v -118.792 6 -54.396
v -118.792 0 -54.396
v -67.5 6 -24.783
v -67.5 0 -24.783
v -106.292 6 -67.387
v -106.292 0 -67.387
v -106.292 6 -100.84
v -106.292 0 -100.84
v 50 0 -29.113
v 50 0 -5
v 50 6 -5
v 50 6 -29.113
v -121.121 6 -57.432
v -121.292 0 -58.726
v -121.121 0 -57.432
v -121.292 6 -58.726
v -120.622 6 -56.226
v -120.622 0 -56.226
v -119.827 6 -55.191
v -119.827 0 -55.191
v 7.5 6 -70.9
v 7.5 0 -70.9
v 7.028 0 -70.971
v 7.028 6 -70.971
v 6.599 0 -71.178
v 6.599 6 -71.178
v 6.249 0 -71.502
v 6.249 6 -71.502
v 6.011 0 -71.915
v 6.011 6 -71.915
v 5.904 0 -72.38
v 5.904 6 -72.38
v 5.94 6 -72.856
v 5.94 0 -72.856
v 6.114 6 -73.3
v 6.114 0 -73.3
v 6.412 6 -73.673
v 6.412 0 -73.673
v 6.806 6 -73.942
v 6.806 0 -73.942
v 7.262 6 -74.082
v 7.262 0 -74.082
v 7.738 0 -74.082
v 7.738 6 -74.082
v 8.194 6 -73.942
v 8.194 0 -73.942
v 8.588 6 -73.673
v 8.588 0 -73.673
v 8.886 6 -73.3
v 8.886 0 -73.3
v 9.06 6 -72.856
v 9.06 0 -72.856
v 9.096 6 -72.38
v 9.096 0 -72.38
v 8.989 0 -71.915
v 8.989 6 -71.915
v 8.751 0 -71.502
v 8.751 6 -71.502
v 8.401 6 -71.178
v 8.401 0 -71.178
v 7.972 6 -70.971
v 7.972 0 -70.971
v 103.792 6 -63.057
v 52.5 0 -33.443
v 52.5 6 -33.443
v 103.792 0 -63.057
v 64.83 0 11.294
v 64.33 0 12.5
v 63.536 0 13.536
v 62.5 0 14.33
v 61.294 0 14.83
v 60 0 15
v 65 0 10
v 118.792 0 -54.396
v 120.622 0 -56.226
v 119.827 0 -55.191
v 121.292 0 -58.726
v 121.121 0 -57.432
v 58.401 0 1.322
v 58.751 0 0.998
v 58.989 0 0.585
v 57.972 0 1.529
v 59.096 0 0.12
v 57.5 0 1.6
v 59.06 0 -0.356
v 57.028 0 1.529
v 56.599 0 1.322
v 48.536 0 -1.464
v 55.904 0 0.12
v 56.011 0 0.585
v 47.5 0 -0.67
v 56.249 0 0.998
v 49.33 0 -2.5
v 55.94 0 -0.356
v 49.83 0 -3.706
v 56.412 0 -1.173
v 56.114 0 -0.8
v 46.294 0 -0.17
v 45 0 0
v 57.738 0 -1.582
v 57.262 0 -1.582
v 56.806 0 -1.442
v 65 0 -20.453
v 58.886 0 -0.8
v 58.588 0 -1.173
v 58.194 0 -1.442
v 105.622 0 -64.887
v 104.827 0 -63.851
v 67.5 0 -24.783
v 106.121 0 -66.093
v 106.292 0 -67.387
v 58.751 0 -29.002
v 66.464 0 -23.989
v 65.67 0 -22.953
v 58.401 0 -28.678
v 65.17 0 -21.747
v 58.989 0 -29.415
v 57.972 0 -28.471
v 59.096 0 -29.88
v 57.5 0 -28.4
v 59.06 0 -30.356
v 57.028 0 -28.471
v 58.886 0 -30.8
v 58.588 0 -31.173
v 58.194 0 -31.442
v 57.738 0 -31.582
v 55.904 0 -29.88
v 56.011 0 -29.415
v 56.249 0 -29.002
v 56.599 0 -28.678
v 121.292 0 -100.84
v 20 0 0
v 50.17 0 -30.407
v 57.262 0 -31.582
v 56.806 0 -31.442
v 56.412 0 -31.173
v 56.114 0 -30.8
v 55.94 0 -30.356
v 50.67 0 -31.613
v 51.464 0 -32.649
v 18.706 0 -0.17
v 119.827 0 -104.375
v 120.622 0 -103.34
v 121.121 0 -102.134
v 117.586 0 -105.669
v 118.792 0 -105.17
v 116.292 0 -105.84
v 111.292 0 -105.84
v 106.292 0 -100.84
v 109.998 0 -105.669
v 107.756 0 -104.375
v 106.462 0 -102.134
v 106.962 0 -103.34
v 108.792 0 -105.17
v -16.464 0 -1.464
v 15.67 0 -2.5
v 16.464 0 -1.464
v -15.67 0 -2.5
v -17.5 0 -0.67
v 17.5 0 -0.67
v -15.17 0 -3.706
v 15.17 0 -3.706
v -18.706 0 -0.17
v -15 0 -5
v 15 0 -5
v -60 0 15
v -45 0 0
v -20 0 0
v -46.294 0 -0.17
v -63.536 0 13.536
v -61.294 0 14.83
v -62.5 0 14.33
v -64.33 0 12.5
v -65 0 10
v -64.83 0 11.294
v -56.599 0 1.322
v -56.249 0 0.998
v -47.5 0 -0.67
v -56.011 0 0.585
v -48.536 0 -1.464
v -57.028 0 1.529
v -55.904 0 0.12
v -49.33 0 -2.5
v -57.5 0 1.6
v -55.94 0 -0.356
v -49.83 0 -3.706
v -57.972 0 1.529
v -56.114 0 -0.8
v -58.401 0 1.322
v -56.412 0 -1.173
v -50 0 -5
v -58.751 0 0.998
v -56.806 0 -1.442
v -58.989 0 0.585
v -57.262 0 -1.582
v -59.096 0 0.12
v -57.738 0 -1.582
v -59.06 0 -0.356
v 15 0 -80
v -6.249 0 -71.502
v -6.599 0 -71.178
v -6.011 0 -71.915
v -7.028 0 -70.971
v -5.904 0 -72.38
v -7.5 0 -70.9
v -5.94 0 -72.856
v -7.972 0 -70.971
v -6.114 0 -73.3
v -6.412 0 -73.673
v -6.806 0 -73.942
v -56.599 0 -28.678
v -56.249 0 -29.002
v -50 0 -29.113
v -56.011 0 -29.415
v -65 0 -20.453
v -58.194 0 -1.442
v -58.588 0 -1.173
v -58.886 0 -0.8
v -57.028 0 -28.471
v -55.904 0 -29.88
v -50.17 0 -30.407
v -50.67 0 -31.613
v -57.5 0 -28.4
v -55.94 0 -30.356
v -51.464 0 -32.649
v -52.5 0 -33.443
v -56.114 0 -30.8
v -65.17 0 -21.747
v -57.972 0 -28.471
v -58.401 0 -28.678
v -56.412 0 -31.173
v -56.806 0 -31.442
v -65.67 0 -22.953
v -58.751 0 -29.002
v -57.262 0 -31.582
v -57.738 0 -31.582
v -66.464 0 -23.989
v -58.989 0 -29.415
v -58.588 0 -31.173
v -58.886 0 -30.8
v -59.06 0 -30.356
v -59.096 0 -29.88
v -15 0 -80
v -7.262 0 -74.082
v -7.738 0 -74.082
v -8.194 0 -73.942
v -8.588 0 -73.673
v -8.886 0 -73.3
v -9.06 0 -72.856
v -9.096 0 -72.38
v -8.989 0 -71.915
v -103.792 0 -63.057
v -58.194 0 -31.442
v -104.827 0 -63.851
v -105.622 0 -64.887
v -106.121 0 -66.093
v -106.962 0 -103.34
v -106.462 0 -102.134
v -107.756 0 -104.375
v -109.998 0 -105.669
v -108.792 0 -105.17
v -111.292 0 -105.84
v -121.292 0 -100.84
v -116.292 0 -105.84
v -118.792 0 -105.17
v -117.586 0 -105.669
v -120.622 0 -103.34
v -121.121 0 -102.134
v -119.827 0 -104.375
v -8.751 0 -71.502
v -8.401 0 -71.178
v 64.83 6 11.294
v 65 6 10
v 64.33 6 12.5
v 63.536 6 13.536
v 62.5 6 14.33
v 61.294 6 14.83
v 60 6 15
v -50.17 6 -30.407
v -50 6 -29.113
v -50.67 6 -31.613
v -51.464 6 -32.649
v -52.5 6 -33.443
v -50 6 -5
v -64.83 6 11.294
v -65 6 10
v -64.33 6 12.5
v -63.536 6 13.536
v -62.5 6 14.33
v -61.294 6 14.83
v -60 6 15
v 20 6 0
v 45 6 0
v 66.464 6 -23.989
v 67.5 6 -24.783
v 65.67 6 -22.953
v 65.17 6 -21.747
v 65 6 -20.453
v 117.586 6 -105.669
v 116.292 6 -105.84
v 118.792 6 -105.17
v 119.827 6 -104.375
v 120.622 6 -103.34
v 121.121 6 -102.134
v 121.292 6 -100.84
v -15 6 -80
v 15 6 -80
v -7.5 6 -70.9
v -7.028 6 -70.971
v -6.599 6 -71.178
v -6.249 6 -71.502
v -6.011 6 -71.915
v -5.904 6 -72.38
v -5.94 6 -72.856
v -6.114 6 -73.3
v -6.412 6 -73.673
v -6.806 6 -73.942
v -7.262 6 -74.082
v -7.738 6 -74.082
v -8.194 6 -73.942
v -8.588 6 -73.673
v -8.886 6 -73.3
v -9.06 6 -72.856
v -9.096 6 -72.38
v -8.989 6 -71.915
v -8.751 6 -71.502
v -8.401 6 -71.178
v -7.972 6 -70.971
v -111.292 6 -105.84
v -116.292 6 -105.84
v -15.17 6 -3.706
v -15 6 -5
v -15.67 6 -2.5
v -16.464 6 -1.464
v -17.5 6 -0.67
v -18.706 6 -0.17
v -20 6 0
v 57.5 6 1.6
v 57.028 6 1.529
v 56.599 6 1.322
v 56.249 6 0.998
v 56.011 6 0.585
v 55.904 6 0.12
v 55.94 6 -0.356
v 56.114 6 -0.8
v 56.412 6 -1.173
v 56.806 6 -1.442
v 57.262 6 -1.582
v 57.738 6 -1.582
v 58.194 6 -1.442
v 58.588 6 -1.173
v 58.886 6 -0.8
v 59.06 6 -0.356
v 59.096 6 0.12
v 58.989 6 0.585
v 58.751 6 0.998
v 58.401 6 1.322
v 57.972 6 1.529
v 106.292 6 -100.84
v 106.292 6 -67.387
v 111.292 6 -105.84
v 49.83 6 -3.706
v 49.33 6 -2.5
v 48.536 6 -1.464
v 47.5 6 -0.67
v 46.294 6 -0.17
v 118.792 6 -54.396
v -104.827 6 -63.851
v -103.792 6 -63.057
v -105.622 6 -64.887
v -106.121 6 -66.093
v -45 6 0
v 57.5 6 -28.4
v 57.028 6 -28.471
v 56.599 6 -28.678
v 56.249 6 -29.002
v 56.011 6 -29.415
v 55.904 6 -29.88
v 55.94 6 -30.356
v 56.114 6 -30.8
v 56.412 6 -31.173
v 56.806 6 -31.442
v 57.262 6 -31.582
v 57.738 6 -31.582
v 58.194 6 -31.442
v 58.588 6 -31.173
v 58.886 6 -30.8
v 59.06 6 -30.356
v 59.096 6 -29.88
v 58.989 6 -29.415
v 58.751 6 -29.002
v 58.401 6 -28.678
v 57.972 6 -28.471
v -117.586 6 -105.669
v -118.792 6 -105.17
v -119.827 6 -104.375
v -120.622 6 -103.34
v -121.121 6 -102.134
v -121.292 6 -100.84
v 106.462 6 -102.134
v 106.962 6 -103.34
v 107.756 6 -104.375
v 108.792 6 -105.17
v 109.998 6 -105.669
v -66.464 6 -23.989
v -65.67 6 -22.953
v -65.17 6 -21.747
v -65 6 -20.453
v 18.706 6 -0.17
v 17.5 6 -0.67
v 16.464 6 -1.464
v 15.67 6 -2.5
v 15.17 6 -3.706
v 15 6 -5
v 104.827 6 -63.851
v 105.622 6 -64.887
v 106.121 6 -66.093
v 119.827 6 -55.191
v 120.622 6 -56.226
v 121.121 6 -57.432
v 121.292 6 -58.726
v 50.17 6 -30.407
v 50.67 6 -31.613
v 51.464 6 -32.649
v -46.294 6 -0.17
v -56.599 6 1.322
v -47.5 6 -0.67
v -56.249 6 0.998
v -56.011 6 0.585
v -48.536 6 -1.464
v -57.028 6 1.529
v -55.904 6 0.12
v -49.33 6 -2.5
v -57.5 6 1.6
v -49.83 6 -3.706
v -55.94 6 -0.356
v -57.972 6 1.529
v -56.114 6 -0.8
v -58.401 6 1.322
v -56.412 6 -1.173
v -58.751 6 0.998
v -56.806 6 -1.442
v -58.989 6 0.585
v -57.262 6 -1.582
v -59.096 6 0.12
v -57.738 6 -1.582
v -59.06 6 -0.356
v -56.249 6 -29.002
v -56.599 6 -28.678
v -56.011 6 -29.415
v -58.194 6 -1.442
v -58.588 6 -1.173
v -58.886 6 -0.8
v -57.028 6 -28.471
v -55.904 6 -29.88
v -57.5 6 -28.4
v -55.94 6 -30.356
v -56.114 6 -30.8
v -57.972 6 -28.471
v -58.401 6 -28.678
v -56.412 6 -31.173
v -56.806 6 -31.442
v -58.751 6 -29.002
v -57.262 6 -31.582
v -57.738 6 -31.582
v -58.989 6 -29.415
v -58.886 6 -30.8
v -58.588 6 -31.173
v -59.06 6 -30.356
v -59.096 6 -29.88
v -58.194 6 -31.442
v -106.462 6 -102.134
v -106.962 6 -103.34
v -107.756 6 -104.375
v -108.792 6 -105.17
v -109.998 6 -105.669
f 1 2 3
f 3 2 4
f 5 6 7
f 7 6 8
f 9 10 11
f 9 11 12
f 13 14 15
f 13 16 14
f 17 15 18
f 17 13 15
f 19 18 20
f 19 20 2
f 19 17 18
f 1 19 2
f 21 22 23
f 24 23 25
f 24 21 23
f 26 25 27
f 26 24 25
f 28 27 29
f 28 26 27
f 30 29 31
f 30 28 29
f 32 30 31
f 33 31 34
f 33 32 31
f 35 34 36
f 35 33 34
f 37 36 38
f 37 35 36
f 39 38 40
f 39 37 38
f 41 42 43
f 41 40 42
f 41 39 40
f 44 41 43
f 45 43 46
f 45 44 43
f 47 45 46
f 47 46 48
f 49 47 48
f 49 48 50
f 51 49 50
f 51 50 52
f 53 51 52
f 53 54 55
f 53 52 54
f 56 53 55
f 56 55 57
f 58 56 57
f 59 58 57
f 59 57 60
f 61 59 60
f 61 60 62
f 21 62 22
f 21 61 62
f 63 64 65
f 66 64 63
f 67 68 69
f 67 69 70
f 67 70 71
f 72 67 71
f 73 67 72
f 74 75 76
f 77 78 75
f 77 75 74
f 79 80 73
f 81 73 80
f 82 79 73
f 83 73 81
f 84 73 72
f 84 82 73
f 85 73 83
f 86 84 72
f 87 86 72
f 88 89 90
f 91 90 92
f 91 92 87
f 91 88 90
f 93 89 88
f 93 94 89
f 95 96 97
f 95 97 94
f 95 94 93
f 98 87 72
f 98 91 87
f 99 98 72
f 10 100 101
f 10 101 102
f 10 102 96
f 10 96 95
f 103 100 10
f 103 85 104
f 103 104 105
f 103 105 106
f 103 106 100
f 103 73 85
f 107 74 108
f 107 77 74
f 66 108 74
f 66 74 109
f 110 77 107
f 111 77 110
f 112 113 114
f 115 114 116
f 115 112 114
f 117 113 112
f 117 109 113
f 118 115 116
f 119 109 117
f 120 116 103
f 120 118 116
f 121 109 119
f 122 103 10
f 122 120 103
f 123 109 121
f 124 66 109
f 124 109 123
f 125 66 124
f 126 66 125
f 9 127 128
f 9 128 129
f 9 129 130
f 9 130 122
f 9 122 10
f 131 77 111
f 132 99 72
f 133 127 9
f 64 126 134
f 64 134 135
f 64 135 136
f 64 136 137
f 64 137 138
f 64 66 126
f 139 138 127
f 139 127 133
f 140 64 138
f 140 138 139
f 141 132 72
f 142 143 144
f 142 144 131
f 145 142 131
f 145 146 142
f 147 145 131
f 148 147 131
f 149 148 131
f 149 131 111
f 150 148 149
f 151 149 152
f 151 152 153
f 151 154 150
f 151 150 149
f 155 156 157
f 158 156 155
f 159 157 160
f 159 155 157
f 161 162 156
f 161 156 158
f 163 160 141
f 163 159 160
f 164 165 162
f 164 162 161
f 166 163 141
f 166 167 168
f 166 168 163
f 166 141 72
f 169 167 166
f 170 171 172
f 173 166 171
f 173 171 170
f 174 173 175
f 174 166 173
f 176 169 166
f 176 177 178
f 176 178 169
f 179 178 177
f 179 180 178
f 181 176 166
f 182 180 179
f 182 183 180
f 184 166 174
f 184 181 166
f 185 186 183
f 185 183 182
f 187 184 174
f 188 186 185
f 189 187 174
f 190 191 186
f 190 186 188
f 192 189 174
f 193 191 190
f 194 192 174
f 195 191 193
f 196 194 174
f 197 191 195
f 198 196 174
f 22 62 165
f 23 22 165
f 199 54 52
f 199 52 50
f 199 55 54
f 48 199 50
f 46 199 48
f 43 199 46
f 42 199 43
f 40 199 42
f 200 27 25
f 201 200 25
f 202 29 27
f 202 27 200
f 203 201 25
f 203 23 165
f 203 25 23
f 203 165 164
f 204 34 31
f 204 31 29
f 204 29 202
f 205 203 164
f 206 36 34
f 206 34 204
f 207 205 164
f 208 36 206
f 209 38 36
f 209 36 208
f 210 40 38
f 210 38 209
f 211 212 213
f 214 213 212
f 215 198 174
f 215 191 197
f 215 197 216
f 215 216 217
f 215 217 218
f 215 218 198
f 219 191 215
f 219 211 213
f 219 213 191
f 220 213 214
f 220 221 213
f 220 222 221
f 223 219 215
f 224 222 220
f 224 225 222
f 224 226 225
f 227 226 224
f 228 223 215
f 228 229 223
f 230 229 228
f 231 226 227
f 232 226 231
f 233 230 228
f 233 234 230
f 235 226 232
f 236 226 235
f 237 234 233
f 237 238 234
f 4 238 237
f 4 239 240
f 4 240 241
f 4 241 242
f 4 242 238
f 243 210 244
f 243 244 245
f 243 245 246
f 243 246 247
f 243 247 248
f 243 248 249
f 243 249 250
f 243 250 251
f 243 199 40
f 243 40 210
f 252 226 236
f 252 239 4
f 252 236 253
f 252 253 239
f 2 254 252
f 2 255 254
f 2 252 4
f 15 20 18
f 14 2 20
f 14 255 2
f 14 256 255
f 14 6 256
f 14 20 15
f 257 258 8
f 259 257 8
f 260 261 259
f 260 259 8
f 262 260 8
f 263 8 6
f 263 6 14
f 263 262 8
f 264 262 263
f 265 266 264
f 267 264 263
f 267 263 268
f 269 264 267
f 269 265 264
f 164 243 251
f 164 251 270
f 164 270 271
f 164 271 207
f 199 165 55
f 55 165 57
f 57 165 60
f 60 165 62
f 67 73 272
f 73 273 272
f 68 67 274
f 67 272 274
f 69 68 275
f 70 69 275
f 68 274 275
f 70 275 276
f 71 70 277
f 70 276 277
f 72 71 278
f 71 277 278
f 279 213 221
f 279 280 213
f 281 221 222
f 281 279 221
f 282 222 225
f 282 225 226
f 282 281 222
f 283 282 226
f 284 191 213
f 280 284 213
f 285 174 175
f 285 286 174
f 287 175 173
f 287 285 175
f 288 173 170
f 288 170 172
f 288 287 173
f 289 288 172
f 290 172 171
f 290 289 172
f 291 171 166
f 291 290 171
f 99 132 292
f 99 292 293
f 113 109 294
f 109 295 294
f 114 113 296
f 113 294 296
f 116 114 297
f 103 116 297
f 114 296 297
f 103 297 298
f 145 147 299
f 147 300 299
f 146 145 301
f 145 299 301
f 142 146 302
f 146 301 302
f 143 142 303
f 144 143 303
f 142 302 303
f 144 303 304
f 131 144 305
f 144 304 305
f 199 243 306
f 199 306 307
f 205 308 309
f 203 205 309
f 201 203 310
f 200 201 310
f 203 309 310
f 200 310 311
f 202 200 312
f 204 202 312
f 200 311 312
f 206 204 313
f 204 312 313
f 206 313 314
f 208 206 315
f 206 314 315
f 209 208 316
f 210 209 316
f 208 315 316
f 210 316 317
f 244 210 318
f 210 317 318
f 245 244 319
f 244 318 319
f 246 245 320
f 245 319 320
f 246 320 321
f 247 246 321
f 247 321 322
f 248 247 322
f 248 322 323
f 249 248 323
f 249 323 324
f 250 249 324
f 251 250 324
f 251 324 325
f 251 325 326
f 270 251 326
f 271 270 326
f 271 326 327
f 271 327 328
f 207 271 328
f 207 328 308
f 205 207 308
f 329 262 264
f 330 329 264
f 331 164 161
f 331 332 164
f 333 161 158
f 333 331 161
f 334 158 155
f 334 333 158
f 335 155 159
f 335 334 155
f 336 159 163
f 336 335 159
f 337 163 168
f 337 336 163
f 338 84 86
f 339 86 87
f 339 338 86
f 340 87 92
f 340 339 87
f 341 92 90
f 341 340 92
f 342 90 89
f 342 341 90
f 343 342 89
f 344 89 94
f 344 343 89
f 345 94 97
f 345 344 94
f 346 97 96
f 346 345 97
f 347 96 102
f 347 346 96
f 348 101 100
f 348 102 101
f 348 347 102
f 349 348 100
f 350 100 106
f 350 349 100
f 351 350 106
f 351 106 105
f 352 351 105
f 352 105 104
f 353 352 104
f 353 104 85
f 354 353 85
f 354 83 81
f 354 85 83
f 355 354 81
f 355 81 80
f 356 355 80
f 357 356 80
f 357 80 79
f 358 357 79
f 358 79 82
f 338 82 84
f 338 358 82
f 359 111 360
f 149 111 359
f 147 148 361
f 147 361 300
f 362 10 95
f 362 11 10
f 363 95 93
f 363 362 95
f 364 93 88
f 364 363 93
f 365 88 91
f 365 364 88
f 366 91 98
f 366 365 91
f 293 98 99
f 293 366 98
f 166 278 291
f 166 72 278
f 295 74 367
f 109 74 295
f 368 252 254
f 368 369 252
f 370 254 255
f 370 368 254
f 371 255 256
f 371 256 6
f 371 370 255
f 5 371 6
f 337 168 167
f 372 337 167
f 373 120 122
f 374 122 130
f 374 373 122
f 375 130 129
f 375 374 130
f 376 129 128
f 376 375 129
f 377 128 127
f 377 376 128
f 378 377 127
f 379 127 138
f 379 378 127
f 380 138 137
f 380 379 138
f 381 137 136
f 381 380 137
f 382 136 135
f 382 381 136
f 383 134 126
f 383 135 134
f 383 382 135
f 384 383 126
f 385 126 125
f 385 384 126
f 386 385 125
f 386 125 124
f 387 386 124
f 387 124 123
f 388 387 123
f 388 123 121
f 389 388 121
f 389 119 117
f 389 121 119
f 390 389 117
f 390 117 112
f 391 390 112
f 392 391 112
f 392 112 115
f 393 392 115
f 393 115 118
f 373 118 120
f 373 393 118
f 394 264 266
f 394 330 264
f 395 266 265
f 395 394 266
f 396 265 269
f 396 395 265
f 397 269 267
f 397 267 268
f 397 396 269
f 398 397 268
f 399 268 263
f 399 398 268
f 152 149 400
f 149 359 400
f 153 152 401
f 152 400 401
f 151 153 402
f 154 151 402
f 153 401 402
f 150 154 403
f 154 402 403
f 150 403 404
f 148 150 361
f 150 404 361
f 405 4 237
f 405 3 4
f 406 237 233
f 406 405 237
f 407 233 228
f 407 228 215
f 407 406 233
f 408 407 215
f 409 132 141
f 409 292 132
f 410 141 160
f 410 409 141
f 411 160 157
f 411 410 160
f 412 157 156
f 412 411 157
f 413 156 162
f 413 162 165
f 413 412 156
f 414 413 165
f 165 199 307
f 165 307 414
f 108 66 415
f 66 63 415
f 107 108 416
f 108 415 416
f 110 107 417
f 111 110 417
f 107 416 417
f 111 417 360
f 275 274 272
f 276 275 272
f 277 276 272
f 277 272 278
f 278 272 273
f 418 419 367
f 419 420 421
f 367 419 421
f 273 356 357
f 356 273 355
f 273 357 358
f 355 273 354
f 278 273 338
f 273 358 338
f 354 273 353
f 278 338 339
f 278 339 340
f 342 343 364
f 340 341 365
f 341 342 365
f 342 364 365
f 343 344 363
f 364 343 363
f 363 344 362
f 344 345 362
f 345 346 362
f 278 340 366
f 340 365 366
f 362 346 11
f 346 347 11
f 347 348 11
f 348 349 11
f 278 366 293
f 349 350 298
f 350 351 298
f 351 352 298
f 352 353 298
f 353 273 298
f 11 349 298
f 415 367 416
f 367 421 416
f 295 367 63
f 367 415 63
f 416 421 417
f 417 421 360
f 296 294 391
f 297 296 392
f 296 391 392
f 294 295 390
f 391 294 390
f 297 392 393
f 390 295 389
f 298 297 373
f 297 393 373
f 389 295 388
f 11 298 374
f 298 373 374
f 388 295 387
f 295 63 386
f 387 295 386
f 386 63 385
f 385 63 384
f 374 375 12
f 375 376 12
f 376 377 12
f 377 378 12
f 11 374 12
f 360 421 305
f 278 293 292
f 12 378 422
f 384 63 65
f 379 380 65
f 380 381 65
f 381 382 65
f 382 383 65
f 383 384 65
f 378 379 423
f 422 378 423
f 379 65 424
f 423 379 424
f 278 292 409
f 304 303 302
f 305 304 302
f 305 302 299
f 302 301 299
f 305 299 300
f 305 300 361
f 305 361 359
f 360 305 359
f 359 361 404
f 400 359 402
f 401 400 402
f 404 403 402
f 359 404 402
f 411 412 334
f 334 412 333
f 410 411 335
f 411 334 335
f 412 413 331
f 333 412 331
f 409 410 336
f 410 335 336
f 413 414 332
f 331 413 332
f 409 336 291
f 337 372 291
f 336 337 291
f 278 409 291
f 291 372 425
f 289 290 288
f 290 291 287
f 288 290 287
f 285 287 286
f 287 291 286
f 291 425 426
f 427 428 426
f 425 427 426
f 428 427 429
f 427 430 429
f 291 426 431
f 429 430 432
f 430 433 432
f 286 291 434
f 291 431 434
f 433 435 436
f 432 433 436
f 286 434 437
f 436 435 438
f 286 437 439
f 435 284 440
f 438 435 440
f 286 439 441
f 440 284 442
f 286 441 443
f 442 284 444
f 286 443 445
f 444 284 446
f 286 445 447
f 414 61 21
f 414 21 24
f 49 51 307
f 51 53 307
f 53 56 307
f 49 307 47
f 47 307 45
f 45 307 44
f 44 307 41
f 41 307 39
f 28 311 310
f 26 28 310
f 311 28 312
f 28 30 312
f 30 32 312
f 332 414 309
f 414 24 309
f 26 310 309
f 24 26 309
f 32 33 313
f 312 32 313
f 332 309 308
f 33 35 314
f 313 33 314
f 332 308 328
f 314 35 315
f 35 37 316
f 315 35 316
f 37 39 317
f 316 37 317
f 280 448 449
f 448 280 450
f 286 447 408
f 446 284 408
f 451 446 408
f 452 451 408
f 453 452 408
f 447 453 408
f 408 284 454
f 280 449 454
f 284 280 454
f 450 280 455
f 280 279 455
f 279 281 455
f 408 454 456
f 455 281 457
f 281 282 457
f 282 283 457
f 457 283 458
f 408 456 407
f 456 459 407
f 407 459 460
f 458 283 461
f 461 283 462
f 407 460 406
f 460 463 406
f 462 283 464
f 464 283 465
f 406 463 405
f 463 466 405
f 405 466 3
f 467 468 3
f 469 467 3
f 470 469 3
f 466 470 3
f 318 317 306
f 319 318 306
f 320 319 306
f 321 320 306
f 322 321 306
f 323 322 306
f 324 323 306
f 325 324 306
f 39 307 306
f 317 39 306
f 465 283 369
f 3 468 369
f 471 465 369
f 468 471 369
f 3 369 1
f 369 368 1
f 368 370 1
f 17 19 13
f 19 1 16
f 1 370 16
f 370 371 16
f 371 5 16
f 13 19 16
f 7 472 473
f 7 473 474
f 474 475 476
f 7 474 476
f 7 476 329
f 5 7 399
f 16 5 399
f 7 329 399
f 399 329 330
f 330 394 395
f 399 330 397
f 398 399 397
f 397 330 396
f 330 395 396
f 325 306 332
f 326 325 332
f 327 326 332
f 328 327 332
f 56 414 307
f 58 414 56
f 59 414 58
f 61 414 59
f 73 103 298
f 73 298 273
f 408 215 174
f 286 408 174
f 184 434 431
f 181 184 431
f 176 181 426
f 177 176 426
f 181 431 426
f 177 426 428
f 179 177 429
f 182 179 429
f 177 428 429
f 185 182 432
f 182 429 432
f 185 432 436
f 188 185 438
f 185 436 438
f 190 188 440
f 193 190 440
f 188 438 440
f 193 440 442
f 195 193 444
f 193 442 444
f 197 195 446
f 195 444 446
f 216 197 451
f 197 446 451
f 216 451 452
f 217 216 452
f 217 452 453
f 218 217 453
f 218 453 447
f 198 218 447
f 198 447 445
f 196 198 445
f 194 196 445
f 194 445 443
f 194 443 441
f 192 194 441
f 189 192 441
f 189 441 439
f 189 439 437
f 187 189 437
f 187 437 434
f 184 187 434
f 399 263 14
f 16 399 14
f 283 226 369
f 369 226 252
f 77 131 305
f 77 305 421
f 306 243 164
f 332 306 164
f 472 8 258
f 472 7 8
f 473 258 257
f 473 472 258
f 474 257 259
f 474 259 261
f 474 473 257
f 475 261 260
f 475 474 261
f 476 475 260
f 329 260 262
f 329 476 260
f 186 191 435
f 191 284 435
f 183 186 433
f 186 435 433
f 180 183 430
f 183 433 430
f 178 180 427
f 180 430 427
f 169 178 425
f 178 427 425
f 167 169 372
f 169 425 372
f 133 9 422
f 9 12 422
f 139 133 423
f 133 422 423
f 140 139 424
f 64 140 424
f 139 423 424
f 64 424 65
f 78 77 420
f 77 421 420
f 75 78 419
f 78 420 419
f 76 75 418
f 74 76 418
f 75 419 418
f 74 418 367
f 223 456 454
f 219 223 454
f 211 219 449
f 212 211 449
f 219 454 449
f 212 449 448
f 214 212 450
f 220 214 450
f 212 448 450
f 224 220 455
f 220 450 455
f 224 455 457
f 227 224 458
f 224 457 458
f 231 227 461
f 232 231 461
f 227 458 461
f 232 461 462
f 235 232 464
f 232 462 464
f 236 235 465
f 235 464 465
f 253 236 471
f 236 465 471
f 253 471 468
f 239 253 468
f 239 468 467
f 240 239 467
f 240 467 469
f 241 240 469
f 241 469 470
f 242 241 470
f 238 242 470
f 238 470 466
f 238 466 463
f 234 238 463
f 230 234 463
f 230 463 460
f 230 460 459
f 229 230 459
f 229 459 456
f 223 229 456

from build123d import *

# Parameters (mm, degrees)
BOSS_EXTRUDE1_DEPTH  = 6
FILLET1_R            = 5
SKETCH2_R            = 1.6
CUT_EXTRUDE1_DEPTH   = 162.089156951
FILLET1_OF_MIRROR1_R = 5


with BuildPart() as part:
    # Sketch1 → Boss-Extrude1 (new body)
    with BuildSketch(Plane(origin=(0, 0, 0), x_dir=(1, 0, 0), z_dir=(0, 1, 0))):
        Polygon((-50, 0), (-50, 32), (-106.291651246, 64.5), (-106.291651246, 105.839745962), (-121.291651246, 105.839745962), (-121.291651246, 55.839745962), (-65, 23.339745962), (-65, -15), (0, -15), (0, 0), (0, 80), (-15, 80), (-15, 0), align=None)
    boss_extrude1 = extrude(amount=BOSS_EXTRUDE1_DEPTH)

    # Fillet1
    fillet1_edges = [part.edges().sort_by_distance(p)[0] for p in [
        (-65, 3, 15),
        (-65, 3, -23.339745962),
        (-121.291651246, 3, -55.839745962),
        (-121.291651246, 3, -105.839745962),
        (-106.291651246, 3, -105.839745962),
        (-106.291651246, 3, -64.5),
        (-50, 3, -32),
        (-50, 3, 0),
        (-15, 3, 0),
    ]]
    fillet(fillet1_edges, radius=FILLET1_R)

    # Sketch2 → Cut-Extrude1 (cut, through all)
    with BuildSketch(Plane(origin=(0, 6, 0), x_dir=(1, 0, 0), z_dir=(0, 1, 0))):
        with Locations(Location((-7.5, 72.5, 0), (0, 0, 270))):
            Circle(SKETCH2_R)
        with Locations(Location((-57.5, 30, 0), (0, 0, 270))):
            Circle(SKETCH2_R)
        with Locations(Location((-57.5, 0, 0), (0, 0, 270))):
            Circle(SKETCH2_R)
    cut_extrude1 = extrude(amount=-CUT_EXTRUDE1_DEPTH, mode=Mode.SUBTRACT)

    # Mirror1: Boss-Extrude1, Cut-Extrude1 across plane
    add(boss_extrude1.mirror(Plane(origin=(0, 0, 0), x_dir=(0, 0, 1), z_dir=(1, 0, 0))))
    add(cut_extrude1.mirror(Plane(origin=(0, 0, 0), x_dir=(0, 0, 1), z_dir=(1, 0, 0))), mode=Mode.SUBTRACT)

    # Fillet1 of Mirror1
    fillet1_of_mirror1_edges = [part.edges().sort_by_distance(p)[0] for p in [
        (65, 3, 15),
        (65, 3, -23.339745962),
        (121.291651246, 3, -55.839745962),
        (121.291651246, 3, -105.839745962),
        (106.291651246, 3, -105.839745962),
        (106.291651246, 3, -64.5),
        (50, 3, -32),
        (50, 3, 0),
        (15, 3, 0),
    ]]
    fillet(fillet1_of_mirror1_edges, radius=FILLET1_OF_MIRROR1_R)


solid = part.part
